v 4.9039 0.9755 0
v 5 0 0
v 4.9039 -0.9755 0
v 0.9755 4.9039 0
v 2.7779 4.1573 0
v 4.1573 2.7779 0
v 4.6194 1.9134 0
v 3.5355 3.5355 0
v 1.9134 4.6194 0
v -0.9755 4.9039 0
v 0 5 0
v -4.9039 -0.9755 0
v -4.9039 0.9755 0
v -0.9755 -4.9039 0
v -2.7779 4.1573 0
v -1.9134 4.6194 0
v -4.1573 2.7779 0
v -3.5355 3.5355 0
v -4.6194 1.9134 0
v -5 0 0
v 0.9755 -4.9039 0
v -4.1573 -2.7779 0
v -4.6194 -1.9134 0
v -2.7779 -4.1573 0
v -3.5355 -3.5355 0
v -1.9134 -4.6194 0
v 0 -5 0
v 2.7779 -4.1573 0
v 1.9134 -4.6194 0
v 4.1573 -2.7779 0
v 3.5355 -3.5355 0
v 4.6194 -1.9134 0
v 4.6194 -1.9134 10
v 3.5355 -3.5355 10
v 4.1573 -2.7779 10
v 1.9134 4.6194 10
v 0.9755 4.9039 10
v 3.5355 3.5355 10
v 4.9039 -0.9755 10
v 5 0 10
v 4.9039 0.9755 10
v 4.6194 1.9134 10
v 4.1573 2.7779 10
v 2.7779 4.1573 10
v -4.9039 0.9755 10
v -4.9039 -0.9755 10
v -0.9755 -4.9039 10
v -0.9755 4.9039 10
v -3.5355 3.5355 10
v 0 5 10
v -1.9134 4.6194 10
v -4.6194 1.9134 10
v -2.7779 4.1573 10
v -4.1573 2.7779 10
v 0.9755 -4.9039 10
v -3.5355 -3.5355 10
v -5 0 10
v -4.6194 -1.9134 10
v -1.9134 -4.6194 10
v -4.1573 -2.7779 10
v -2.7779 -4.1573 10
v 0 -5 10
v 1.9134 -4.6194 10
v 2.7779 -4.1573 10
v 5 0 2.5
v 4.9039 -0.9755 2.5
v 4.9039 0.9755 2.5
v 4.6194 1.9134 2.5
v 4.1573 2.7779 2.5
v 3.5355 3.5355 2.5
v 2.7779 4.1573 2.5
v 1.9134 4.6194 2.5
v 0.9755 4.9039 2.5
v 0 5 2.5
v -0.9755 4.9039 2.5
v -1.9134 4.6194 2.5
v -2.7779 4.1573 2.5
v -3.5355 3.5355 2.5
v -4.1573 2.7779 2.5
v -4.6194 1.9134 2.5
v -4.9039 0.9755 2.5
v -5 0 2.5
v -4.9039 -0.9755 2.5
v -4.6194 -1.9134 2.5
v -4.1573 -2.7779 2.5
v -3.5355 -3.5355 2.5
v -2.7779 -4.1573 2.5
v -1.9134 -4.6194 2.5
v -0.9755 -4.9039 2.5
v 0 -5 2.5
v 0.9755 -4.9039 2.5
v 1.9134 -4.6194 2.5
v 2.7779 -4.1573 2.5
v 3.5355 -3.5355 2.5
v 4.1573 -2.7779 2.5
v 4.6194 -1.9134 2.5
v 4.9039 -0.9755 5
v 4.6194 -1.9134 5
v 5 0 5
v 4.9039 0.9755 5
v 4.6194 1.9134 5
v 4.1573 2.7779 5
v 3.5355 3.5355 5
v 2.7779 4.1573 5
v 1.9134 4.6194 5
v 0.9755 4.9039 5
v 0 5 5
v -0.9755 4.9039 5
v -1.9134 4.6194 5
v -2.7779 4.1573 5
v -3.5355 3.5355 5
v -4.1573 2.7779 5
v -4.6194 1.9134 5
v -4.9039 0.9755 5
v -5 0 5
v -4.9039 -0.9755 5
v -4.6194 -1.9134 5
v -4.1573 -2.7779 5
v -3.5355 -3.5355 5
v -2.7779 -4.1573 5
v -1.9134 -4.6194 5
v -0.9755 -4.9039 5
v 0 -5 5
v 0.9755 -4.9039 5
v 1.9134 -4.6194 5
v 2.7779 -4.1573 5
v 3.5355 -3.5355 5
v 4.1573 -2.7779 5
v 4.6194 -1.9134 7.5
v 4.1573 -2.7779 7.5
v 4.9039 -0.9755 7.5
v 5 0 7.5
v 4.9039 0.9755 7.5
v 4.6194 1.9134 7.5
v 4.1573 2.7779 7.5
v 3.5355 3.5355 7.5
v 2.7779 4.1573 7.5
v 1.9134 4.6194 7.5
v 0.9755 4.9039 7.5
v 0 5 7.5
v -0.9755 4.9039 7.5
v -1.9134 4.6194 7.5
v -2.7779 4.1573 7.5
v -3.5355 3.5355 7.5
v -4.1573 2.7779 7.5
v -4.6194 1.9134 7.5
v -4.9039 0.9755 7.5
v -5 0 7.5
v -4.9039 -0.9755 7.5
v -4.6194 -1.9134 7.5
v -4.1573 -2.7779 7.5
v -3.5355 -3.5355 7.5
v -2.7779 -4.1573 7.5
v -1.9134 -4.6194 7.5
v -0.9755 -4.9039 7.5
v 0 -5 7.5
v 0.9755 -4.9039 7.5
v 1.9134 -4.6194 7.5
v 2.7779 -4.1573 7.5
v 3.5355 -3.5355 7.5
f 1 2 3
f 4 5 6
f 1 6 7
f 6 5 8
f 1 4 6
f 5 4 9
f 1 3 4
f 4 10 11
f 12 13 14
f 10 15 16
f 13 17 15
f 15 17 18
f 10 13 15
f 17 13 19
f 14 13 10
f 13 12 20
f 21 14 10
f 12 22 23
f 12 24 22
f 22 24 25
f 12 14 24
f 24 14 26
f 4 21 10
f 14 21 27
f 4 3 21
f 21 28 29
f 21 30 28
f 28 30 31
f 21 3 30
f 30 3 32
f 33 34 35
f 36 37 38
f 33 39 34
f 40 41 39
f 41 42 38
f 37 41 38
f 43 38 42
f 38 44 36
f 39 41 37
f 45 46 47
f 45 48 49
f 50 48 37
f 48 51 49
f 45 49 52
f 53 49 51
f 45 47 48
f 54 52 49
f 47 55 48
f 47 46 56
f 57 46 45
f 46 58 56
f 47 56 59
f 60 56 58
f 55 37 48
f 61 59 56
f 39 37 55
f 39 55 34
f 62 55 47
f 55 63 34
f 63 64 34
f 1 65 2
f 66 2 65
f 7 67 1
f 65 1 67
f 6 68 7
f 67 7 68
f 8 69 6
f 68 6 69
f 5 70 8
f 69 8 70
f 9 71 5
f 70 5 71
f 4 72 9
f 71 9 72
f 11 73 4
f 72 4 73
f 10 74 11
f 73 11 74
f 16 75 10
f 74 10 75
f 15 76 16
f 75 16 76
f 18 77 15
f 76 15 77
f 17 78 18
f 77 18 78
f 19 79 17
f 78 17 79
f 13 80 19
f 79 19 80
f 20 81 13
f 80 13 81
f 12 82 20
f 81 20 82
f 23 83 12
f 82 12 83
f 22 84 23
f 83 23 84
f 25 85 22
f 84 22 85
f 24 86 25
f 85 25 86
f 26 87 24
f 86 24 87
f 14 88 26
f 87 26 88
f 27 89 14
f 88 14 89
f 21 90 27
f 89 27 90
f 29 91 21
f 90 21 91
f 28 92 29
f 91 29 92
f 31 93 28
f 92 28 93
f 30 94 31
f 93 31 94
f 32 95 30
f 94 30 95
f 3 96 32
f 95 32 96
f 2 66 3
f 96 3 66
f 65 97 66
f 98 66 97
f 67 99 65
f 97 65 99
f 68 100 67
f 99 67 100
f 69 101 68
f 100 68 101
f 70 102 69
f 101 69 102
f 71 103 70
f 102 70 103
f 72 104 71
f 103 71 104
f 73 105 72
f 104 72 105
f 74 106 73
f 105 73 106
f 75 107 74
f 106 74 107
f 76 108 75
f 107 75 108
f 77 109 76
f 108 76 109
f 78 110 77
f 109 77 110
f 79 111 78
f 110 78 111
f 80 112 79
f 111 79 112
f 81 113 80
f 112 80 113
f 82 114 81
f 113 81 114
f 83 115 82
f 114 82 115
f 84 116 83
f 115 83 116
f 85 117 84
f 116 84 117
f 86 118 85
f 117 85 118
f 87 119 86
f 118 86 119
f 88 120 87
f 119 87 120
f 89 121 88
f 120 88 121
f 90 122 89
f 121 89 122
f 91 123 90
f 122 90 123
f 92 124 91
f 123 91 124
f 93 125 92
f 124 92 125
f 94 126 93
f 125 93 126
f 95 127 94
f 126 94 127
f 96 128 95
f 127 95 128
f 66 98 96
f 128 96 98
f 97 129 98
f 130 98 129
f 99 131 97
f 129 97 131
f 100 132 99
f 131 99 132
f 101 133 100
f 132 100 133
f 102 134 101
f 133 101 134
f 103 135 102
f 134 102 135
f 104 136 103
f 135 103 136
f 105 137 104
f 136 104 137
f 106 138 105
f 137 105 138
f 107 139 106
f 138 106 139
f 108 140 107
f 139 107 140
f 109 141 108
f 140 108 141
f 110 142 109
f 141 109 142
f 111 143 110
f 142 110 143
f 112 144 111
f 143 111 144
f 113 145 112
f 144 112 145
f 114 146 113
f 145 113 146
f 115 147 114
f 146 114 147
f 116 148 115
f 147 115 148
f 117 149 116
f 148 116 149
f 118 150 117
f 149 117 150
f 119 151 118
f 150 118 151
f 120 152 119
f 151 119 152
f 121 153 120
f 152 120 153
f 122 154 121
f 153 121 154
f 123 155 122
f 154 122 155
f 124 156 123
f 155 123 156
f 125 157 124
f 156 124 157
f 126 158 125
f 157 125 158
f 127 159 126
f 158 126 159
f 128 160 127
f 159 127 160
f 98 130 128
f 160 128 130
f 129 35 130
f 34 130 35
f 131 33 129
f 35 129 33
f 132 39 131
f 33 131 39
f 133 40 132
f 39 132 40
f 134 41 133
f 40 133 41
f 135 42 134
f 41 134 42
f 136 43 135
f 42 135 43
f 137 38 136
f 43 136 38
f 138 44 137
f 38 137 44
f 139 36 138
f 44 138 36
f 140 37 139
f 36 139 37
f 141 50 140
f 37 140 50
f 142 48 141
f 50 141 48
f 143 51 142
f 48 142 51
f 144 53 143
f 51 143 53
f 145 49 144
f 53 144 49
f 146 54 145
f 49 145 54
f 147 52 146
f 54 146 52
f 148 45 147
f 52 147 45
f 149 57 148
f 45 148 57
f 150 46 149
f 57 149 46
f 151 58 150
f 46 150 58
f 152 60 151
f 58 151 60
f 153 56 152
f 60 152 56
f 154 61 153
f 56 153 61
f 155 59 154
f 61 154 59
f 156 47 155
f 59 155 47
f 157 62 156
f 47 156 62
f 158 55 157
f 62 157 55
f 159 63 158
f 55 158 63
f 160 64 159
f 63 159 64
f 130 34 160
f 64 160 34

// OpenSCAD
// Generated by scadwright. Do not hand-edit —
// edit the Python source and regenerate.

$fn = 32;

linear_extrude(height=10, center=false, twist=45) {
    circle(r=5);
}
